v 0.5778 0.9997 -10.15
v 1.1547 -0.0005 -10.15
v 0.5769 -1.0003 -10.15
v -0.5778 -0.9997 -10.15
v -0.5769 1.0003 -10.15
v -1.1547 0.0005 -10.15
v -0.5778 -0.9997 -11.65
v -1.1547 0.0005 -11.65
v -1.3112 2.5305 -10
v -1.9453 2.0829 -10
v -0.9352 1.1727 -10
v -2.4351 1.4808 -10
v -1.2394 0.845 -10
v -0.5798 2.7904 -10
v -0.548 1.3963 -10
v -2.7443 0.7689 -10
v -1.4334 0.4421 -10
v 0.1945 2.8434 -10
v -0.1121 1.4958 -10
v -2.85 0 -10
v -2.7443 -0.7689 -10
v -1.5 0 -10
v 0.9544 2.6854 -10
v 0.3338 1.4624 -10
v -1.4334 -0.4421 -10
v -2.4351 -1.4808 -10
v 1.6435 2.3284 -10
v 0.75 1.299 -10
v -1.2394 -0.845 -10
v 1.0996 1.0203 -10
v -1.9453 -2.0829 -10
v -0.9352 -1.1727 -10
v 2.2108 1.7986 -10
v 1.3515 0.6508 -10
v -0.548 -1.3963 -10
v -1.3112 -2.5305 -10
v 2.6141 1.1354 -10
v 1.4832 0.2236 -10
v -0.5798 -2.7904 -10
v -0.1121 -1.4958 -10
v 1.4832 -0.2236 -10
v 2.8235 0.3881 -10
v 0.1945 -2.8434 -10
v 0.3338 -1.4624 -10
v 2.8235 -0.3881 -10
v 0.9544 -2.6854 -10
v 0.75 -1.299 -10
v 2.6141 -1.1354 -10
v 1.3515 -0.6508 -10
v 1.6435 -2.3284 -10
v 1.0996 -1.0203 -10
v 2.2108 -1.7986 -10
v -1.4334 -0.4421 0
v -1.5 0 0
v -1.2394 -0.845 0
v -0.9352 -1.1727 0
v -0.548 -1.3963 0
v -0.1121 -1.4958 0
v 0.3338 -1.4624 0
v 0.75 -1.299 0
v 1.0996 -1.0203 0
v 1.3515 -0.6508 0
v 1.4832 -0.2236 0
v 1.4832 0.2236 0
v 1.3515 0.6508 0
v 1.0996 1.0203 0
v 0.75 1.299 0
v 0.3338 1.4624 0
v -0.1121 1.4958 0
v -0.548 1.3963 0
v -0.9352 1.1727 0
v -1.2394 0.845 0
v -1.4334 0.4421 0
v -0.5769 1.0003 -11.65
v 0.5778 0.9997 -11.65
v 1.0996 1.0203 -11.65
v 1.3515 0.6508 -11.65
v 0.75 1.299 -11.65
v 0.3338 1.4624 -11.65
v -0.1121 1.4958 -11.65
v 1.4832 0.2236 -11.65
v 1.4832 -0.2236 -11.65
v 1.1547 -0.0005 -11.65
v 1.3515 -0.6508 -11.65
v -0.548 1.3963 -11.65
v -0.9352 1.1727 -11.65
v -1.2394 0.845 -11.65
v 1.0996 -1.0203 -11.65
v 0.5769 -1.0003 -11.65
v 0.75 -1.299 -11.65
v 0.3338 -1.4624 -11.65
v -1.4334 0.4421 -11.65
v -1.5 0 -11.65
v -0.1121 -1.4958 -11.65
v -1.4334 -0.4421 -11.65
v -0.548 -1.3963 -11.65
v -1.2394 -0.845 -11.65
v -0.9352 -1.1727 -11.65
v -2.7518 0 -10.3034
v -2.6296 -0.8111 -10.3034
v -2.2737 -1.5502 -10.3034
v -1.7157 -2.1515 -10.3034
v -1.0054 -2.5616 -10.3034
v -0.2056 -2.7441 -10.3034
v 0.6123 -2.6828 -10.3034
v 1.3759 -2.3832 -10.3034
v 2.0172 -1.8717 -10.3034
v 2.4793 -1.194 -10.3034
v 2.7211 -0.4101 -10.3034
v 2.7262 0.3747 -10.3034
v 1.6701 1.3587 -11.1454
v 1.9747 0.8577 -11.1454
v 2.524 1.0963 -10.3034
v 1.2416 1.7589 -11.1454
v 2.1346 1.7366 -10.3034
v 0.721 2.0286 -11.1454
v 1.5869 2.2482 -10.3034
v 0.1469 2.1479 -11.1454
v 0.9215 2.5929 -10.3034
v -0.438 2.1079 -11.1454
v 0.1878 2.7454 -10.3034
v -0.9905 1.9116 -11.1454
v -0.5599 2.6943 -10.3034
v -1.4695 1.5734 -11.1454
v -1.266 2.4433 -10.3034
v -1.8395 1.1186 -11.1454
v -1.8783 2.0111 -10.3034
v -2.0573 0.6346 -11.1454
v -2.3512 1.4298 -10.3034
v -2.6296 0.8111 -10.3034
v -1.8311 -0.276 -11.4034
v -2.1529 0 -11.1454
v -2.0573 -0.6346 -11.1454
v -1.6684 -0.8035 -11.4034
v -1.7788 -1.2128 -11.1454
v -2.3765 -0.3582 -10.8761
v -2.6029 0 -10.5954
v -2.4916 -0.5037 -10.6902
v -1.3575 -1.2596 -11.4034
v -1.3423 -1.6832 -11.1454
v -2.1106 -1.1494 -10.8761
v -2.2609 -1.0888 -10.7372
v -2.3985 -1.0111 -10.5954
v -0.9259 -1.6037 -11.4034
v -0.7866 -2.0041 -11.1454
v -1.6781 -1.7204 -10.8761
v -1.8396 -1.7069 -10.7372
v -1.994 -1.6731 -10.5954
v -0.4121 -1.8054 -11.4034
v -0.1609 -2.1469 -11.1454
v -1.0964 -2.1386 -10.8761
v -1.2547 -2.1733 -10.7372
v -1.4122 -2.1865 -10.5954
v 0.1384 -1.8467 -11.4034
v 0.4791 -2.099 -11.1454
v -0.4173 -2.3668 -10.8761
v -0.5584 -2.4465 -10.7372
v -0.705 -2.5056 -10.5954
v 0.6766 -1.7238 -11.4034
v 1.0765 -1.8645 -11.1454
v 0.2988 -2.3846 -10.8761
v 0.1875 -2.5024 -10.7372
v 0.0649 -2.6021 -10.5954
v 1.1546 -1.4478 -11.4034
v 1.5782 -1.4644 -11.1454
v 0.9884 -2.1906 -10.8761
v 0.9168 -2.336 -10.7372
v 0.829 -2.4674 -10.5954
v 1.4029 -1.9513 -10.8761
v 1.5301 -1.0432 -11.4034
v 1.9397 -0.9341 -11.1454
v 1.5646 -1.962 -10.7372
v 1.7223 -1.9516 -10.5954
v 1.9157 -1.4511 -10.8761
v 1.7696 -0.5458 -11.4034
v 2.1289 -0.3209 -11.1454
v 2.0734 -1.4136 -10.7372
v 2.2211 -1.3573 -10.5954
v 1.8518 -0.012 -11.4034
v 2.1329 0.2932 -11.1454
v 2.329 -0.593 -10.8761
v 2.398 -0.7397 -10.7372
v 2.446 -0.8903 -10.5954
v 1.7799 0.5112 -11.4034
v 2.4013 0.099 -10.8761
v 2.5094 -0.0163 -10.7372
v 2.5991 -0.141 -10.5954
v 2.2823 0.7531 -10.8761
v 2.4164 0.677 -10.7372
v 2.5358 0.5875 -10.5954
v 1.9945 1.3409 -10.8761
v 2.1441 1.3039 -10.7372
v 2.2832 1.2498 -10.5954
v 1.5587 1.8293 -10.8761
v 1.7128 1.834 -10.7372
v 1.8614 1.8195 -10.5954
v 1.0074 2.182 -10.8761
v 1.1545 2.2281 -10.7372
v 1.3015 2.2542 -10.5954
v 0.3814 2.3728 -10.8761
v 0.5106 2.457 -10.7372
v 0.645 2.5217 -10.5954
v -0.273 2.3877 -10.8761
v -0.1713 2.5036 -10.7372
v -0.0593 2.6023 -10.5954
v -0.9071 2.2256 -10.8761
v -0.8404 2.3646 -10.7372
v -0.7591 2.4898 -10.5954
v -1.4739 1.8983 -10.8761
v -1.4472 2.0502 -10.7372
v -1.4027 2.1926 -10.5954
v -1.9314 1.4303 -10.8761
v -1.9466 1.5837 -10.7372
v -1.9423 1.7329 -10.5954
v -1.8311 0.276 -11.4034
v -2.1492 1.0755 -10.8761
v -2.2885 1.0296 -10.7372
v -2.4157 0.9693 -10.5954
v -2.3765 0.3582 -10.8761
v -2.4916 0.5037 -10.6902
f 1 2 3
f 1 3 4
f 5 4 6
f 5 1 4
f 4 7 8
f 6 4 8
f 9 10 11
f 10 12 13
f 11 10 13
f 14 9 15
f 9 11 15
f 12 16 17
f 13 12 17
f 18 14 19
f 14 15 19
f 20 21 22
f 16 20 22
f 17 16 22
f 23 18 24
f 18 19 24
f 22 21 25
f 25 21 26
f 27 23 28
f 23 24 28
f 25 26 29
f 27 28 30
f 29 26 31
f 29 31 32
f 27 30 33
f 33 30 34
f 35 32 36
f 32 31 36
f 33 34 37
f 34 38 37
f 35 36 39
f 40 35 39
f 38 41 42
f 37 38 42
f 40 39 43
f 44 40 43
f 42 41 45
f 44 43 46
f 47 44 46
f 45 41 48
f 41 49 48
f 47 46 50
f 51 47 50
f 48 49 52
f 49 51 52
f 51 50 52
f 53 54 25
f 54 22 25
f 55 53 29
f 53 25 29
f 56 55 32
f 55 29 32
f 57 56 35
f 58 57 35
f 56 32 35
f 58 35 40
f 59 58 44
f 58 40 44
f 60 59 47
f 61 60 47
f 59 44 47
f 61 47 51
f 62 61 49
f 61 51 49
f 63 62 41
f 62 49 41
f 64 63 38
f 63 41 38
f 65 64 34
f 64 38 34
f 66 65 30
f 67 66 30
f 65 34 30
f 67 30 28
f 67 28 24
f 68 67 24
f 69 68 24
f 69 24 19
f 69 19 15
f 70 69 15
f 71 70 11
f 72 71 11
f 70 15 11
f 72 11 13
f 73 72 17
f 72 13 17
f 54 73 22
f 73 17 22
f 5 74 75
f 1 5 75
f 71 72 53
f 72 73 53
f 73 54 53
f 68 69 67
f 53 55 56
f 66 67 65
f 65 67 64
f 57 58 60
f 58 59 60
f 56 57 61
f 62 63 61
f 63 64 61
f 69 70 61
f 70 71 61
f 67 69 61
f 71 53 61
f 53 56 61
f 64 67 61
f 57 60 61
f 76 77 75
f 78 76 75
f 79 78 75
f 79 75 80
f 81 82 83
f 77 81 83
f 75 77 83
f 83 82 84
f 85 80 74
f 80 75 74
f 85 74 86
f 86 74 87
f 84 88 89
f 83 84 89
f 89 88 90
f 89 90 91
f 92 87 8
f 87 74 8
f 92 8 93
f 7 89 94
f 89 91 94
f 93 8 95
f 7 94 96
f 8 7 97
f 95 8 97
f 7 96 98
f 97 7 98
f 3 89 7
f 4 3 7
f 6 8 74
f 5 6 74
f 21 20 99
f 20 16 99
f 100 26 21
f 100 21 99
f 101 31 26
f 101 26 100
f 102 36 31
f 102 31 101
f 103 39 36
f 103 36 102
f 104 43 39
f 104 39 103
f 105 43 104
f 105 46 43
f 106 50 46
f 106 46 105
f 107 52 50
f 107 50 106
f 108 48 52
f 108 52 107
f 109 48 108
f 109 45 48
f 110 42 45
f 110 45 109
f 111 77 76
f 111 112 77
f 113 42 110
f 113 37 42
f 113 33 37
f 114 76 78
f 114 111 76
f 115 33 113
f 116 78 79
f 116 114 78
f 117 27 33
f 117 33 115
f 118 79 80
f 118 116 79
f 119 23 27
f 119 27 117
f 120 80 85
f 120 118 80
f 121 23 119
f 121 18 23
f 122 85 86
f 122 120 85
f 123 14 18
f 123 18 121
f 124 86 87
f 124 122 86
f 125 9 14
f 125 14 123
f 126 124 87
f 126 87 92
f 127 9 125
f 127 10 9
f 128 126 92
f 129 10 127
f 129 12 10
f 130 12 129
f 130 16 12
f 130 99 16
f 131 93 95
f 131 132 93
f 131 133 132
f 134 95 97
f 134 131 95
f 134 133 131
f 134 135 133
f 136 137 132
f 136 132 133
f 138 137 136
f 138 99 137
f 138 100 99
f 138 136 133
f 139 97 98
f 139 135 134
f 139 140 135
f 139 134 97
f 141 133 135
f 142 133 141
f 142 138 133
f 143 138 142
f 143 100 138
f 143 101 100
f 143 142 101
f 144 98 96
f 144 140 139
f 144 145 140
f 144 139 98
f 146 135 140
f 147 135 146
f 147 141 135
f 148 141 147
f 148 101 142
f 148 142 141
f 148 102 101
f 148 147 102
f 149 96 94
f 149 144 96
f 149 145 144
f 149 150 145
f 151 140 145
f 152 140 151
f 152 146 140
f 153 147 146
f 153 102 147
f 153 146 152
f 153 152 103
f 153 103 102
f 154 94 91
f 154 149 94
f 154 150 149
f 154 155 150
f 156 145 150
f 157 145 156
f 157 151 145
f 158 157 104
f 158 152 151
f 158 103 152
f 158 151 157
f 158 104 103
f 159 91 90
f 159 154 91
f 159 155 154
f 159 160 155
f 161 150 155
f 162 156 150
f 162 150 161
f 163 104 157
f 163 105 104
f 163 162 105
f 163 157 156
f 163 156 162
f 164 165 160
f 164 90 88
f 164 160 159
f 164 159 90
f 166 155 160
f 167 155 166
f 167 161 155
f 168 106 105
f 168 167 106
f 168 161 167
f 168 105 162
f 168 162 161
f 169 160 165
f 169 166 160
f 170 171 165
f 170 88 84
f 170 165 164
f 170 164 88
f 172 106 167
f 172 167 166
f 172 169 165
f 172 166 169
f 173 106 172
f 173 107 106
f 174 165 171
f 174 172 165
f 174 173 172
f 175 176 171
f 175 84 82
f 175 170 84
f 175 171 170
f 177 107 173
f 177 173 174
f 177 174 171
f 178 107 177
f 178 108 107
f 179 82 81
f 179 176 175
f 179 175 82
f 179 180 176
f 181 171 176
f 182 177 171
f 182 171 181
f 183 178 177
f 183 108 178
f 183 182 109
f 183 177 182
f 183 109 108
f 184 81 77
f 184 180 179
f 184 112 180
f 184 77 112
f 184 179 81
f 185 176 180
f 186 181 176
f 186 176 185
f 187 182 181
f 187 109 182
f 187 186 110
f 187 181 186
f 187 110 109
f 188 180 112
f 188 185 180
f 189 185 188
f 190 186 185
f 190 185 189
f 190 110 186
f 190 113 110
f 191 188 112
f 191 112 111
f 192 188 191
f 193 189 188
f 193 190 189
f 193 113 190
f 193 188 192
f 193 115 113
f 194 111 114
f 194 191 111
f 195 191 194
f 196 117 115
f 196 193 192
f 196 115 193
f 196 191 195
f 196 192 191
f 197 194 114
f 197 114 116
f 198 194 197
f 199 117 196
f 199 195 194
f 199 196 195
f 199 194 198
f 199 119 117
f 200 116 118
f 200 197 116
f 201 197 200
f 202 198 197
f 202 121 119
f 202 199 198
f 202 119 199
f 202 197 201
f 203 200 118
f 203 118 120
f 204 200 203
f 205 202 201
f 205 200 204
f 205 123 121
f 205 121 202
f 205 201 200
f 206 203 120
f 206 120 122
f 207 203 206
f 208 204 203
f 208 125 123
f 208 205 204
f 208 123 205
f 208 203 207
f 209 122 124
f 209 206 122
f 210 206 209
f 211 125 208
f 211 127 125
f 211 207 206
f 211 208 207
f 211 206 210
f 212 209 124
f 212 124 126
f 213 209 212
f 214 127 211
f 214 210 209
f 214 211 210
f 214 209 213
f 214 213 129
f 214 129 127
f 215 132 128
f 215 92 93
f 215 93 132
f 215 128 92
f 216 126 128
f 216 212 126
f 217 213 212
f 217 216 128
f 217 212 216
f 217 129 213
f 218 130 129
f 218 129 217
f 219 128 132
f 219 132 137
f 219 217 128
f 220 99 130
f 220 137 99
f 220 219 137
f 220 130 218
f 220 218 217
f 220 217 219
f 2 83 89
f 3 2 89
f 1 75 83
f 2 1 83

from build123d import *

# Parameters (mm, degrees)
CUT_EXTRUDE1_DEPTH = 1.5


with BuildPart() as part:
    # Sketch1 → Revolve1 (revolve)
    with BuildSketch(Plane(origin=(0, 0, 0), x_dir=(1, 0, 0), z_dir=(0, 1, 0)), mode=Mode.PRIVATE) as revolve1_sk:
        with BuildLine():
            Line((1.5, 0), (1.5, 10))
            Line((1.5, 10), (2.85, 10))
            add(Edge.make_bspline(
                [(1.5, 11.65), (2.631595647, 10.927172538), (2.85, 10)],
                knots=[0, 0, 0, 0.488855094, 0.488855094, 0.488855094], degree=2))
            Line((1.5, 11.65), (0, 11.65))
            Line((0, 11.65), (0, 0))
            Line((0, 0), (1.5, 0))
        make_face()
    revolve(revolve1_sk.sketch.rotate(Axis((0, 0, -11.65), (0, 0, 1)), 180), axis=Axis((0, 0, -11.65), (0, 0, 1)))

    # Sketch2 → Cut-Extrude1 (cut)
    with BuildSketch(Plane(origin=(0, 0, -11.65), x_dir=(-1, 0, 0), z_dir=(0, 0, -1))):
        Polygon((0.576895528, 1.000262407), (-0.577804891, 0.999737386), (-1.154700419, -0.000525021), (-0.576895528, -1.000262407), (0.577804891, -0.999737386), (1.154700419, 0.000525021), align=None)
    extrude(amount=-CUT_EXTRUDE1_DEPTH, mode=Mode.SUBTRACT)


solid = part.part
